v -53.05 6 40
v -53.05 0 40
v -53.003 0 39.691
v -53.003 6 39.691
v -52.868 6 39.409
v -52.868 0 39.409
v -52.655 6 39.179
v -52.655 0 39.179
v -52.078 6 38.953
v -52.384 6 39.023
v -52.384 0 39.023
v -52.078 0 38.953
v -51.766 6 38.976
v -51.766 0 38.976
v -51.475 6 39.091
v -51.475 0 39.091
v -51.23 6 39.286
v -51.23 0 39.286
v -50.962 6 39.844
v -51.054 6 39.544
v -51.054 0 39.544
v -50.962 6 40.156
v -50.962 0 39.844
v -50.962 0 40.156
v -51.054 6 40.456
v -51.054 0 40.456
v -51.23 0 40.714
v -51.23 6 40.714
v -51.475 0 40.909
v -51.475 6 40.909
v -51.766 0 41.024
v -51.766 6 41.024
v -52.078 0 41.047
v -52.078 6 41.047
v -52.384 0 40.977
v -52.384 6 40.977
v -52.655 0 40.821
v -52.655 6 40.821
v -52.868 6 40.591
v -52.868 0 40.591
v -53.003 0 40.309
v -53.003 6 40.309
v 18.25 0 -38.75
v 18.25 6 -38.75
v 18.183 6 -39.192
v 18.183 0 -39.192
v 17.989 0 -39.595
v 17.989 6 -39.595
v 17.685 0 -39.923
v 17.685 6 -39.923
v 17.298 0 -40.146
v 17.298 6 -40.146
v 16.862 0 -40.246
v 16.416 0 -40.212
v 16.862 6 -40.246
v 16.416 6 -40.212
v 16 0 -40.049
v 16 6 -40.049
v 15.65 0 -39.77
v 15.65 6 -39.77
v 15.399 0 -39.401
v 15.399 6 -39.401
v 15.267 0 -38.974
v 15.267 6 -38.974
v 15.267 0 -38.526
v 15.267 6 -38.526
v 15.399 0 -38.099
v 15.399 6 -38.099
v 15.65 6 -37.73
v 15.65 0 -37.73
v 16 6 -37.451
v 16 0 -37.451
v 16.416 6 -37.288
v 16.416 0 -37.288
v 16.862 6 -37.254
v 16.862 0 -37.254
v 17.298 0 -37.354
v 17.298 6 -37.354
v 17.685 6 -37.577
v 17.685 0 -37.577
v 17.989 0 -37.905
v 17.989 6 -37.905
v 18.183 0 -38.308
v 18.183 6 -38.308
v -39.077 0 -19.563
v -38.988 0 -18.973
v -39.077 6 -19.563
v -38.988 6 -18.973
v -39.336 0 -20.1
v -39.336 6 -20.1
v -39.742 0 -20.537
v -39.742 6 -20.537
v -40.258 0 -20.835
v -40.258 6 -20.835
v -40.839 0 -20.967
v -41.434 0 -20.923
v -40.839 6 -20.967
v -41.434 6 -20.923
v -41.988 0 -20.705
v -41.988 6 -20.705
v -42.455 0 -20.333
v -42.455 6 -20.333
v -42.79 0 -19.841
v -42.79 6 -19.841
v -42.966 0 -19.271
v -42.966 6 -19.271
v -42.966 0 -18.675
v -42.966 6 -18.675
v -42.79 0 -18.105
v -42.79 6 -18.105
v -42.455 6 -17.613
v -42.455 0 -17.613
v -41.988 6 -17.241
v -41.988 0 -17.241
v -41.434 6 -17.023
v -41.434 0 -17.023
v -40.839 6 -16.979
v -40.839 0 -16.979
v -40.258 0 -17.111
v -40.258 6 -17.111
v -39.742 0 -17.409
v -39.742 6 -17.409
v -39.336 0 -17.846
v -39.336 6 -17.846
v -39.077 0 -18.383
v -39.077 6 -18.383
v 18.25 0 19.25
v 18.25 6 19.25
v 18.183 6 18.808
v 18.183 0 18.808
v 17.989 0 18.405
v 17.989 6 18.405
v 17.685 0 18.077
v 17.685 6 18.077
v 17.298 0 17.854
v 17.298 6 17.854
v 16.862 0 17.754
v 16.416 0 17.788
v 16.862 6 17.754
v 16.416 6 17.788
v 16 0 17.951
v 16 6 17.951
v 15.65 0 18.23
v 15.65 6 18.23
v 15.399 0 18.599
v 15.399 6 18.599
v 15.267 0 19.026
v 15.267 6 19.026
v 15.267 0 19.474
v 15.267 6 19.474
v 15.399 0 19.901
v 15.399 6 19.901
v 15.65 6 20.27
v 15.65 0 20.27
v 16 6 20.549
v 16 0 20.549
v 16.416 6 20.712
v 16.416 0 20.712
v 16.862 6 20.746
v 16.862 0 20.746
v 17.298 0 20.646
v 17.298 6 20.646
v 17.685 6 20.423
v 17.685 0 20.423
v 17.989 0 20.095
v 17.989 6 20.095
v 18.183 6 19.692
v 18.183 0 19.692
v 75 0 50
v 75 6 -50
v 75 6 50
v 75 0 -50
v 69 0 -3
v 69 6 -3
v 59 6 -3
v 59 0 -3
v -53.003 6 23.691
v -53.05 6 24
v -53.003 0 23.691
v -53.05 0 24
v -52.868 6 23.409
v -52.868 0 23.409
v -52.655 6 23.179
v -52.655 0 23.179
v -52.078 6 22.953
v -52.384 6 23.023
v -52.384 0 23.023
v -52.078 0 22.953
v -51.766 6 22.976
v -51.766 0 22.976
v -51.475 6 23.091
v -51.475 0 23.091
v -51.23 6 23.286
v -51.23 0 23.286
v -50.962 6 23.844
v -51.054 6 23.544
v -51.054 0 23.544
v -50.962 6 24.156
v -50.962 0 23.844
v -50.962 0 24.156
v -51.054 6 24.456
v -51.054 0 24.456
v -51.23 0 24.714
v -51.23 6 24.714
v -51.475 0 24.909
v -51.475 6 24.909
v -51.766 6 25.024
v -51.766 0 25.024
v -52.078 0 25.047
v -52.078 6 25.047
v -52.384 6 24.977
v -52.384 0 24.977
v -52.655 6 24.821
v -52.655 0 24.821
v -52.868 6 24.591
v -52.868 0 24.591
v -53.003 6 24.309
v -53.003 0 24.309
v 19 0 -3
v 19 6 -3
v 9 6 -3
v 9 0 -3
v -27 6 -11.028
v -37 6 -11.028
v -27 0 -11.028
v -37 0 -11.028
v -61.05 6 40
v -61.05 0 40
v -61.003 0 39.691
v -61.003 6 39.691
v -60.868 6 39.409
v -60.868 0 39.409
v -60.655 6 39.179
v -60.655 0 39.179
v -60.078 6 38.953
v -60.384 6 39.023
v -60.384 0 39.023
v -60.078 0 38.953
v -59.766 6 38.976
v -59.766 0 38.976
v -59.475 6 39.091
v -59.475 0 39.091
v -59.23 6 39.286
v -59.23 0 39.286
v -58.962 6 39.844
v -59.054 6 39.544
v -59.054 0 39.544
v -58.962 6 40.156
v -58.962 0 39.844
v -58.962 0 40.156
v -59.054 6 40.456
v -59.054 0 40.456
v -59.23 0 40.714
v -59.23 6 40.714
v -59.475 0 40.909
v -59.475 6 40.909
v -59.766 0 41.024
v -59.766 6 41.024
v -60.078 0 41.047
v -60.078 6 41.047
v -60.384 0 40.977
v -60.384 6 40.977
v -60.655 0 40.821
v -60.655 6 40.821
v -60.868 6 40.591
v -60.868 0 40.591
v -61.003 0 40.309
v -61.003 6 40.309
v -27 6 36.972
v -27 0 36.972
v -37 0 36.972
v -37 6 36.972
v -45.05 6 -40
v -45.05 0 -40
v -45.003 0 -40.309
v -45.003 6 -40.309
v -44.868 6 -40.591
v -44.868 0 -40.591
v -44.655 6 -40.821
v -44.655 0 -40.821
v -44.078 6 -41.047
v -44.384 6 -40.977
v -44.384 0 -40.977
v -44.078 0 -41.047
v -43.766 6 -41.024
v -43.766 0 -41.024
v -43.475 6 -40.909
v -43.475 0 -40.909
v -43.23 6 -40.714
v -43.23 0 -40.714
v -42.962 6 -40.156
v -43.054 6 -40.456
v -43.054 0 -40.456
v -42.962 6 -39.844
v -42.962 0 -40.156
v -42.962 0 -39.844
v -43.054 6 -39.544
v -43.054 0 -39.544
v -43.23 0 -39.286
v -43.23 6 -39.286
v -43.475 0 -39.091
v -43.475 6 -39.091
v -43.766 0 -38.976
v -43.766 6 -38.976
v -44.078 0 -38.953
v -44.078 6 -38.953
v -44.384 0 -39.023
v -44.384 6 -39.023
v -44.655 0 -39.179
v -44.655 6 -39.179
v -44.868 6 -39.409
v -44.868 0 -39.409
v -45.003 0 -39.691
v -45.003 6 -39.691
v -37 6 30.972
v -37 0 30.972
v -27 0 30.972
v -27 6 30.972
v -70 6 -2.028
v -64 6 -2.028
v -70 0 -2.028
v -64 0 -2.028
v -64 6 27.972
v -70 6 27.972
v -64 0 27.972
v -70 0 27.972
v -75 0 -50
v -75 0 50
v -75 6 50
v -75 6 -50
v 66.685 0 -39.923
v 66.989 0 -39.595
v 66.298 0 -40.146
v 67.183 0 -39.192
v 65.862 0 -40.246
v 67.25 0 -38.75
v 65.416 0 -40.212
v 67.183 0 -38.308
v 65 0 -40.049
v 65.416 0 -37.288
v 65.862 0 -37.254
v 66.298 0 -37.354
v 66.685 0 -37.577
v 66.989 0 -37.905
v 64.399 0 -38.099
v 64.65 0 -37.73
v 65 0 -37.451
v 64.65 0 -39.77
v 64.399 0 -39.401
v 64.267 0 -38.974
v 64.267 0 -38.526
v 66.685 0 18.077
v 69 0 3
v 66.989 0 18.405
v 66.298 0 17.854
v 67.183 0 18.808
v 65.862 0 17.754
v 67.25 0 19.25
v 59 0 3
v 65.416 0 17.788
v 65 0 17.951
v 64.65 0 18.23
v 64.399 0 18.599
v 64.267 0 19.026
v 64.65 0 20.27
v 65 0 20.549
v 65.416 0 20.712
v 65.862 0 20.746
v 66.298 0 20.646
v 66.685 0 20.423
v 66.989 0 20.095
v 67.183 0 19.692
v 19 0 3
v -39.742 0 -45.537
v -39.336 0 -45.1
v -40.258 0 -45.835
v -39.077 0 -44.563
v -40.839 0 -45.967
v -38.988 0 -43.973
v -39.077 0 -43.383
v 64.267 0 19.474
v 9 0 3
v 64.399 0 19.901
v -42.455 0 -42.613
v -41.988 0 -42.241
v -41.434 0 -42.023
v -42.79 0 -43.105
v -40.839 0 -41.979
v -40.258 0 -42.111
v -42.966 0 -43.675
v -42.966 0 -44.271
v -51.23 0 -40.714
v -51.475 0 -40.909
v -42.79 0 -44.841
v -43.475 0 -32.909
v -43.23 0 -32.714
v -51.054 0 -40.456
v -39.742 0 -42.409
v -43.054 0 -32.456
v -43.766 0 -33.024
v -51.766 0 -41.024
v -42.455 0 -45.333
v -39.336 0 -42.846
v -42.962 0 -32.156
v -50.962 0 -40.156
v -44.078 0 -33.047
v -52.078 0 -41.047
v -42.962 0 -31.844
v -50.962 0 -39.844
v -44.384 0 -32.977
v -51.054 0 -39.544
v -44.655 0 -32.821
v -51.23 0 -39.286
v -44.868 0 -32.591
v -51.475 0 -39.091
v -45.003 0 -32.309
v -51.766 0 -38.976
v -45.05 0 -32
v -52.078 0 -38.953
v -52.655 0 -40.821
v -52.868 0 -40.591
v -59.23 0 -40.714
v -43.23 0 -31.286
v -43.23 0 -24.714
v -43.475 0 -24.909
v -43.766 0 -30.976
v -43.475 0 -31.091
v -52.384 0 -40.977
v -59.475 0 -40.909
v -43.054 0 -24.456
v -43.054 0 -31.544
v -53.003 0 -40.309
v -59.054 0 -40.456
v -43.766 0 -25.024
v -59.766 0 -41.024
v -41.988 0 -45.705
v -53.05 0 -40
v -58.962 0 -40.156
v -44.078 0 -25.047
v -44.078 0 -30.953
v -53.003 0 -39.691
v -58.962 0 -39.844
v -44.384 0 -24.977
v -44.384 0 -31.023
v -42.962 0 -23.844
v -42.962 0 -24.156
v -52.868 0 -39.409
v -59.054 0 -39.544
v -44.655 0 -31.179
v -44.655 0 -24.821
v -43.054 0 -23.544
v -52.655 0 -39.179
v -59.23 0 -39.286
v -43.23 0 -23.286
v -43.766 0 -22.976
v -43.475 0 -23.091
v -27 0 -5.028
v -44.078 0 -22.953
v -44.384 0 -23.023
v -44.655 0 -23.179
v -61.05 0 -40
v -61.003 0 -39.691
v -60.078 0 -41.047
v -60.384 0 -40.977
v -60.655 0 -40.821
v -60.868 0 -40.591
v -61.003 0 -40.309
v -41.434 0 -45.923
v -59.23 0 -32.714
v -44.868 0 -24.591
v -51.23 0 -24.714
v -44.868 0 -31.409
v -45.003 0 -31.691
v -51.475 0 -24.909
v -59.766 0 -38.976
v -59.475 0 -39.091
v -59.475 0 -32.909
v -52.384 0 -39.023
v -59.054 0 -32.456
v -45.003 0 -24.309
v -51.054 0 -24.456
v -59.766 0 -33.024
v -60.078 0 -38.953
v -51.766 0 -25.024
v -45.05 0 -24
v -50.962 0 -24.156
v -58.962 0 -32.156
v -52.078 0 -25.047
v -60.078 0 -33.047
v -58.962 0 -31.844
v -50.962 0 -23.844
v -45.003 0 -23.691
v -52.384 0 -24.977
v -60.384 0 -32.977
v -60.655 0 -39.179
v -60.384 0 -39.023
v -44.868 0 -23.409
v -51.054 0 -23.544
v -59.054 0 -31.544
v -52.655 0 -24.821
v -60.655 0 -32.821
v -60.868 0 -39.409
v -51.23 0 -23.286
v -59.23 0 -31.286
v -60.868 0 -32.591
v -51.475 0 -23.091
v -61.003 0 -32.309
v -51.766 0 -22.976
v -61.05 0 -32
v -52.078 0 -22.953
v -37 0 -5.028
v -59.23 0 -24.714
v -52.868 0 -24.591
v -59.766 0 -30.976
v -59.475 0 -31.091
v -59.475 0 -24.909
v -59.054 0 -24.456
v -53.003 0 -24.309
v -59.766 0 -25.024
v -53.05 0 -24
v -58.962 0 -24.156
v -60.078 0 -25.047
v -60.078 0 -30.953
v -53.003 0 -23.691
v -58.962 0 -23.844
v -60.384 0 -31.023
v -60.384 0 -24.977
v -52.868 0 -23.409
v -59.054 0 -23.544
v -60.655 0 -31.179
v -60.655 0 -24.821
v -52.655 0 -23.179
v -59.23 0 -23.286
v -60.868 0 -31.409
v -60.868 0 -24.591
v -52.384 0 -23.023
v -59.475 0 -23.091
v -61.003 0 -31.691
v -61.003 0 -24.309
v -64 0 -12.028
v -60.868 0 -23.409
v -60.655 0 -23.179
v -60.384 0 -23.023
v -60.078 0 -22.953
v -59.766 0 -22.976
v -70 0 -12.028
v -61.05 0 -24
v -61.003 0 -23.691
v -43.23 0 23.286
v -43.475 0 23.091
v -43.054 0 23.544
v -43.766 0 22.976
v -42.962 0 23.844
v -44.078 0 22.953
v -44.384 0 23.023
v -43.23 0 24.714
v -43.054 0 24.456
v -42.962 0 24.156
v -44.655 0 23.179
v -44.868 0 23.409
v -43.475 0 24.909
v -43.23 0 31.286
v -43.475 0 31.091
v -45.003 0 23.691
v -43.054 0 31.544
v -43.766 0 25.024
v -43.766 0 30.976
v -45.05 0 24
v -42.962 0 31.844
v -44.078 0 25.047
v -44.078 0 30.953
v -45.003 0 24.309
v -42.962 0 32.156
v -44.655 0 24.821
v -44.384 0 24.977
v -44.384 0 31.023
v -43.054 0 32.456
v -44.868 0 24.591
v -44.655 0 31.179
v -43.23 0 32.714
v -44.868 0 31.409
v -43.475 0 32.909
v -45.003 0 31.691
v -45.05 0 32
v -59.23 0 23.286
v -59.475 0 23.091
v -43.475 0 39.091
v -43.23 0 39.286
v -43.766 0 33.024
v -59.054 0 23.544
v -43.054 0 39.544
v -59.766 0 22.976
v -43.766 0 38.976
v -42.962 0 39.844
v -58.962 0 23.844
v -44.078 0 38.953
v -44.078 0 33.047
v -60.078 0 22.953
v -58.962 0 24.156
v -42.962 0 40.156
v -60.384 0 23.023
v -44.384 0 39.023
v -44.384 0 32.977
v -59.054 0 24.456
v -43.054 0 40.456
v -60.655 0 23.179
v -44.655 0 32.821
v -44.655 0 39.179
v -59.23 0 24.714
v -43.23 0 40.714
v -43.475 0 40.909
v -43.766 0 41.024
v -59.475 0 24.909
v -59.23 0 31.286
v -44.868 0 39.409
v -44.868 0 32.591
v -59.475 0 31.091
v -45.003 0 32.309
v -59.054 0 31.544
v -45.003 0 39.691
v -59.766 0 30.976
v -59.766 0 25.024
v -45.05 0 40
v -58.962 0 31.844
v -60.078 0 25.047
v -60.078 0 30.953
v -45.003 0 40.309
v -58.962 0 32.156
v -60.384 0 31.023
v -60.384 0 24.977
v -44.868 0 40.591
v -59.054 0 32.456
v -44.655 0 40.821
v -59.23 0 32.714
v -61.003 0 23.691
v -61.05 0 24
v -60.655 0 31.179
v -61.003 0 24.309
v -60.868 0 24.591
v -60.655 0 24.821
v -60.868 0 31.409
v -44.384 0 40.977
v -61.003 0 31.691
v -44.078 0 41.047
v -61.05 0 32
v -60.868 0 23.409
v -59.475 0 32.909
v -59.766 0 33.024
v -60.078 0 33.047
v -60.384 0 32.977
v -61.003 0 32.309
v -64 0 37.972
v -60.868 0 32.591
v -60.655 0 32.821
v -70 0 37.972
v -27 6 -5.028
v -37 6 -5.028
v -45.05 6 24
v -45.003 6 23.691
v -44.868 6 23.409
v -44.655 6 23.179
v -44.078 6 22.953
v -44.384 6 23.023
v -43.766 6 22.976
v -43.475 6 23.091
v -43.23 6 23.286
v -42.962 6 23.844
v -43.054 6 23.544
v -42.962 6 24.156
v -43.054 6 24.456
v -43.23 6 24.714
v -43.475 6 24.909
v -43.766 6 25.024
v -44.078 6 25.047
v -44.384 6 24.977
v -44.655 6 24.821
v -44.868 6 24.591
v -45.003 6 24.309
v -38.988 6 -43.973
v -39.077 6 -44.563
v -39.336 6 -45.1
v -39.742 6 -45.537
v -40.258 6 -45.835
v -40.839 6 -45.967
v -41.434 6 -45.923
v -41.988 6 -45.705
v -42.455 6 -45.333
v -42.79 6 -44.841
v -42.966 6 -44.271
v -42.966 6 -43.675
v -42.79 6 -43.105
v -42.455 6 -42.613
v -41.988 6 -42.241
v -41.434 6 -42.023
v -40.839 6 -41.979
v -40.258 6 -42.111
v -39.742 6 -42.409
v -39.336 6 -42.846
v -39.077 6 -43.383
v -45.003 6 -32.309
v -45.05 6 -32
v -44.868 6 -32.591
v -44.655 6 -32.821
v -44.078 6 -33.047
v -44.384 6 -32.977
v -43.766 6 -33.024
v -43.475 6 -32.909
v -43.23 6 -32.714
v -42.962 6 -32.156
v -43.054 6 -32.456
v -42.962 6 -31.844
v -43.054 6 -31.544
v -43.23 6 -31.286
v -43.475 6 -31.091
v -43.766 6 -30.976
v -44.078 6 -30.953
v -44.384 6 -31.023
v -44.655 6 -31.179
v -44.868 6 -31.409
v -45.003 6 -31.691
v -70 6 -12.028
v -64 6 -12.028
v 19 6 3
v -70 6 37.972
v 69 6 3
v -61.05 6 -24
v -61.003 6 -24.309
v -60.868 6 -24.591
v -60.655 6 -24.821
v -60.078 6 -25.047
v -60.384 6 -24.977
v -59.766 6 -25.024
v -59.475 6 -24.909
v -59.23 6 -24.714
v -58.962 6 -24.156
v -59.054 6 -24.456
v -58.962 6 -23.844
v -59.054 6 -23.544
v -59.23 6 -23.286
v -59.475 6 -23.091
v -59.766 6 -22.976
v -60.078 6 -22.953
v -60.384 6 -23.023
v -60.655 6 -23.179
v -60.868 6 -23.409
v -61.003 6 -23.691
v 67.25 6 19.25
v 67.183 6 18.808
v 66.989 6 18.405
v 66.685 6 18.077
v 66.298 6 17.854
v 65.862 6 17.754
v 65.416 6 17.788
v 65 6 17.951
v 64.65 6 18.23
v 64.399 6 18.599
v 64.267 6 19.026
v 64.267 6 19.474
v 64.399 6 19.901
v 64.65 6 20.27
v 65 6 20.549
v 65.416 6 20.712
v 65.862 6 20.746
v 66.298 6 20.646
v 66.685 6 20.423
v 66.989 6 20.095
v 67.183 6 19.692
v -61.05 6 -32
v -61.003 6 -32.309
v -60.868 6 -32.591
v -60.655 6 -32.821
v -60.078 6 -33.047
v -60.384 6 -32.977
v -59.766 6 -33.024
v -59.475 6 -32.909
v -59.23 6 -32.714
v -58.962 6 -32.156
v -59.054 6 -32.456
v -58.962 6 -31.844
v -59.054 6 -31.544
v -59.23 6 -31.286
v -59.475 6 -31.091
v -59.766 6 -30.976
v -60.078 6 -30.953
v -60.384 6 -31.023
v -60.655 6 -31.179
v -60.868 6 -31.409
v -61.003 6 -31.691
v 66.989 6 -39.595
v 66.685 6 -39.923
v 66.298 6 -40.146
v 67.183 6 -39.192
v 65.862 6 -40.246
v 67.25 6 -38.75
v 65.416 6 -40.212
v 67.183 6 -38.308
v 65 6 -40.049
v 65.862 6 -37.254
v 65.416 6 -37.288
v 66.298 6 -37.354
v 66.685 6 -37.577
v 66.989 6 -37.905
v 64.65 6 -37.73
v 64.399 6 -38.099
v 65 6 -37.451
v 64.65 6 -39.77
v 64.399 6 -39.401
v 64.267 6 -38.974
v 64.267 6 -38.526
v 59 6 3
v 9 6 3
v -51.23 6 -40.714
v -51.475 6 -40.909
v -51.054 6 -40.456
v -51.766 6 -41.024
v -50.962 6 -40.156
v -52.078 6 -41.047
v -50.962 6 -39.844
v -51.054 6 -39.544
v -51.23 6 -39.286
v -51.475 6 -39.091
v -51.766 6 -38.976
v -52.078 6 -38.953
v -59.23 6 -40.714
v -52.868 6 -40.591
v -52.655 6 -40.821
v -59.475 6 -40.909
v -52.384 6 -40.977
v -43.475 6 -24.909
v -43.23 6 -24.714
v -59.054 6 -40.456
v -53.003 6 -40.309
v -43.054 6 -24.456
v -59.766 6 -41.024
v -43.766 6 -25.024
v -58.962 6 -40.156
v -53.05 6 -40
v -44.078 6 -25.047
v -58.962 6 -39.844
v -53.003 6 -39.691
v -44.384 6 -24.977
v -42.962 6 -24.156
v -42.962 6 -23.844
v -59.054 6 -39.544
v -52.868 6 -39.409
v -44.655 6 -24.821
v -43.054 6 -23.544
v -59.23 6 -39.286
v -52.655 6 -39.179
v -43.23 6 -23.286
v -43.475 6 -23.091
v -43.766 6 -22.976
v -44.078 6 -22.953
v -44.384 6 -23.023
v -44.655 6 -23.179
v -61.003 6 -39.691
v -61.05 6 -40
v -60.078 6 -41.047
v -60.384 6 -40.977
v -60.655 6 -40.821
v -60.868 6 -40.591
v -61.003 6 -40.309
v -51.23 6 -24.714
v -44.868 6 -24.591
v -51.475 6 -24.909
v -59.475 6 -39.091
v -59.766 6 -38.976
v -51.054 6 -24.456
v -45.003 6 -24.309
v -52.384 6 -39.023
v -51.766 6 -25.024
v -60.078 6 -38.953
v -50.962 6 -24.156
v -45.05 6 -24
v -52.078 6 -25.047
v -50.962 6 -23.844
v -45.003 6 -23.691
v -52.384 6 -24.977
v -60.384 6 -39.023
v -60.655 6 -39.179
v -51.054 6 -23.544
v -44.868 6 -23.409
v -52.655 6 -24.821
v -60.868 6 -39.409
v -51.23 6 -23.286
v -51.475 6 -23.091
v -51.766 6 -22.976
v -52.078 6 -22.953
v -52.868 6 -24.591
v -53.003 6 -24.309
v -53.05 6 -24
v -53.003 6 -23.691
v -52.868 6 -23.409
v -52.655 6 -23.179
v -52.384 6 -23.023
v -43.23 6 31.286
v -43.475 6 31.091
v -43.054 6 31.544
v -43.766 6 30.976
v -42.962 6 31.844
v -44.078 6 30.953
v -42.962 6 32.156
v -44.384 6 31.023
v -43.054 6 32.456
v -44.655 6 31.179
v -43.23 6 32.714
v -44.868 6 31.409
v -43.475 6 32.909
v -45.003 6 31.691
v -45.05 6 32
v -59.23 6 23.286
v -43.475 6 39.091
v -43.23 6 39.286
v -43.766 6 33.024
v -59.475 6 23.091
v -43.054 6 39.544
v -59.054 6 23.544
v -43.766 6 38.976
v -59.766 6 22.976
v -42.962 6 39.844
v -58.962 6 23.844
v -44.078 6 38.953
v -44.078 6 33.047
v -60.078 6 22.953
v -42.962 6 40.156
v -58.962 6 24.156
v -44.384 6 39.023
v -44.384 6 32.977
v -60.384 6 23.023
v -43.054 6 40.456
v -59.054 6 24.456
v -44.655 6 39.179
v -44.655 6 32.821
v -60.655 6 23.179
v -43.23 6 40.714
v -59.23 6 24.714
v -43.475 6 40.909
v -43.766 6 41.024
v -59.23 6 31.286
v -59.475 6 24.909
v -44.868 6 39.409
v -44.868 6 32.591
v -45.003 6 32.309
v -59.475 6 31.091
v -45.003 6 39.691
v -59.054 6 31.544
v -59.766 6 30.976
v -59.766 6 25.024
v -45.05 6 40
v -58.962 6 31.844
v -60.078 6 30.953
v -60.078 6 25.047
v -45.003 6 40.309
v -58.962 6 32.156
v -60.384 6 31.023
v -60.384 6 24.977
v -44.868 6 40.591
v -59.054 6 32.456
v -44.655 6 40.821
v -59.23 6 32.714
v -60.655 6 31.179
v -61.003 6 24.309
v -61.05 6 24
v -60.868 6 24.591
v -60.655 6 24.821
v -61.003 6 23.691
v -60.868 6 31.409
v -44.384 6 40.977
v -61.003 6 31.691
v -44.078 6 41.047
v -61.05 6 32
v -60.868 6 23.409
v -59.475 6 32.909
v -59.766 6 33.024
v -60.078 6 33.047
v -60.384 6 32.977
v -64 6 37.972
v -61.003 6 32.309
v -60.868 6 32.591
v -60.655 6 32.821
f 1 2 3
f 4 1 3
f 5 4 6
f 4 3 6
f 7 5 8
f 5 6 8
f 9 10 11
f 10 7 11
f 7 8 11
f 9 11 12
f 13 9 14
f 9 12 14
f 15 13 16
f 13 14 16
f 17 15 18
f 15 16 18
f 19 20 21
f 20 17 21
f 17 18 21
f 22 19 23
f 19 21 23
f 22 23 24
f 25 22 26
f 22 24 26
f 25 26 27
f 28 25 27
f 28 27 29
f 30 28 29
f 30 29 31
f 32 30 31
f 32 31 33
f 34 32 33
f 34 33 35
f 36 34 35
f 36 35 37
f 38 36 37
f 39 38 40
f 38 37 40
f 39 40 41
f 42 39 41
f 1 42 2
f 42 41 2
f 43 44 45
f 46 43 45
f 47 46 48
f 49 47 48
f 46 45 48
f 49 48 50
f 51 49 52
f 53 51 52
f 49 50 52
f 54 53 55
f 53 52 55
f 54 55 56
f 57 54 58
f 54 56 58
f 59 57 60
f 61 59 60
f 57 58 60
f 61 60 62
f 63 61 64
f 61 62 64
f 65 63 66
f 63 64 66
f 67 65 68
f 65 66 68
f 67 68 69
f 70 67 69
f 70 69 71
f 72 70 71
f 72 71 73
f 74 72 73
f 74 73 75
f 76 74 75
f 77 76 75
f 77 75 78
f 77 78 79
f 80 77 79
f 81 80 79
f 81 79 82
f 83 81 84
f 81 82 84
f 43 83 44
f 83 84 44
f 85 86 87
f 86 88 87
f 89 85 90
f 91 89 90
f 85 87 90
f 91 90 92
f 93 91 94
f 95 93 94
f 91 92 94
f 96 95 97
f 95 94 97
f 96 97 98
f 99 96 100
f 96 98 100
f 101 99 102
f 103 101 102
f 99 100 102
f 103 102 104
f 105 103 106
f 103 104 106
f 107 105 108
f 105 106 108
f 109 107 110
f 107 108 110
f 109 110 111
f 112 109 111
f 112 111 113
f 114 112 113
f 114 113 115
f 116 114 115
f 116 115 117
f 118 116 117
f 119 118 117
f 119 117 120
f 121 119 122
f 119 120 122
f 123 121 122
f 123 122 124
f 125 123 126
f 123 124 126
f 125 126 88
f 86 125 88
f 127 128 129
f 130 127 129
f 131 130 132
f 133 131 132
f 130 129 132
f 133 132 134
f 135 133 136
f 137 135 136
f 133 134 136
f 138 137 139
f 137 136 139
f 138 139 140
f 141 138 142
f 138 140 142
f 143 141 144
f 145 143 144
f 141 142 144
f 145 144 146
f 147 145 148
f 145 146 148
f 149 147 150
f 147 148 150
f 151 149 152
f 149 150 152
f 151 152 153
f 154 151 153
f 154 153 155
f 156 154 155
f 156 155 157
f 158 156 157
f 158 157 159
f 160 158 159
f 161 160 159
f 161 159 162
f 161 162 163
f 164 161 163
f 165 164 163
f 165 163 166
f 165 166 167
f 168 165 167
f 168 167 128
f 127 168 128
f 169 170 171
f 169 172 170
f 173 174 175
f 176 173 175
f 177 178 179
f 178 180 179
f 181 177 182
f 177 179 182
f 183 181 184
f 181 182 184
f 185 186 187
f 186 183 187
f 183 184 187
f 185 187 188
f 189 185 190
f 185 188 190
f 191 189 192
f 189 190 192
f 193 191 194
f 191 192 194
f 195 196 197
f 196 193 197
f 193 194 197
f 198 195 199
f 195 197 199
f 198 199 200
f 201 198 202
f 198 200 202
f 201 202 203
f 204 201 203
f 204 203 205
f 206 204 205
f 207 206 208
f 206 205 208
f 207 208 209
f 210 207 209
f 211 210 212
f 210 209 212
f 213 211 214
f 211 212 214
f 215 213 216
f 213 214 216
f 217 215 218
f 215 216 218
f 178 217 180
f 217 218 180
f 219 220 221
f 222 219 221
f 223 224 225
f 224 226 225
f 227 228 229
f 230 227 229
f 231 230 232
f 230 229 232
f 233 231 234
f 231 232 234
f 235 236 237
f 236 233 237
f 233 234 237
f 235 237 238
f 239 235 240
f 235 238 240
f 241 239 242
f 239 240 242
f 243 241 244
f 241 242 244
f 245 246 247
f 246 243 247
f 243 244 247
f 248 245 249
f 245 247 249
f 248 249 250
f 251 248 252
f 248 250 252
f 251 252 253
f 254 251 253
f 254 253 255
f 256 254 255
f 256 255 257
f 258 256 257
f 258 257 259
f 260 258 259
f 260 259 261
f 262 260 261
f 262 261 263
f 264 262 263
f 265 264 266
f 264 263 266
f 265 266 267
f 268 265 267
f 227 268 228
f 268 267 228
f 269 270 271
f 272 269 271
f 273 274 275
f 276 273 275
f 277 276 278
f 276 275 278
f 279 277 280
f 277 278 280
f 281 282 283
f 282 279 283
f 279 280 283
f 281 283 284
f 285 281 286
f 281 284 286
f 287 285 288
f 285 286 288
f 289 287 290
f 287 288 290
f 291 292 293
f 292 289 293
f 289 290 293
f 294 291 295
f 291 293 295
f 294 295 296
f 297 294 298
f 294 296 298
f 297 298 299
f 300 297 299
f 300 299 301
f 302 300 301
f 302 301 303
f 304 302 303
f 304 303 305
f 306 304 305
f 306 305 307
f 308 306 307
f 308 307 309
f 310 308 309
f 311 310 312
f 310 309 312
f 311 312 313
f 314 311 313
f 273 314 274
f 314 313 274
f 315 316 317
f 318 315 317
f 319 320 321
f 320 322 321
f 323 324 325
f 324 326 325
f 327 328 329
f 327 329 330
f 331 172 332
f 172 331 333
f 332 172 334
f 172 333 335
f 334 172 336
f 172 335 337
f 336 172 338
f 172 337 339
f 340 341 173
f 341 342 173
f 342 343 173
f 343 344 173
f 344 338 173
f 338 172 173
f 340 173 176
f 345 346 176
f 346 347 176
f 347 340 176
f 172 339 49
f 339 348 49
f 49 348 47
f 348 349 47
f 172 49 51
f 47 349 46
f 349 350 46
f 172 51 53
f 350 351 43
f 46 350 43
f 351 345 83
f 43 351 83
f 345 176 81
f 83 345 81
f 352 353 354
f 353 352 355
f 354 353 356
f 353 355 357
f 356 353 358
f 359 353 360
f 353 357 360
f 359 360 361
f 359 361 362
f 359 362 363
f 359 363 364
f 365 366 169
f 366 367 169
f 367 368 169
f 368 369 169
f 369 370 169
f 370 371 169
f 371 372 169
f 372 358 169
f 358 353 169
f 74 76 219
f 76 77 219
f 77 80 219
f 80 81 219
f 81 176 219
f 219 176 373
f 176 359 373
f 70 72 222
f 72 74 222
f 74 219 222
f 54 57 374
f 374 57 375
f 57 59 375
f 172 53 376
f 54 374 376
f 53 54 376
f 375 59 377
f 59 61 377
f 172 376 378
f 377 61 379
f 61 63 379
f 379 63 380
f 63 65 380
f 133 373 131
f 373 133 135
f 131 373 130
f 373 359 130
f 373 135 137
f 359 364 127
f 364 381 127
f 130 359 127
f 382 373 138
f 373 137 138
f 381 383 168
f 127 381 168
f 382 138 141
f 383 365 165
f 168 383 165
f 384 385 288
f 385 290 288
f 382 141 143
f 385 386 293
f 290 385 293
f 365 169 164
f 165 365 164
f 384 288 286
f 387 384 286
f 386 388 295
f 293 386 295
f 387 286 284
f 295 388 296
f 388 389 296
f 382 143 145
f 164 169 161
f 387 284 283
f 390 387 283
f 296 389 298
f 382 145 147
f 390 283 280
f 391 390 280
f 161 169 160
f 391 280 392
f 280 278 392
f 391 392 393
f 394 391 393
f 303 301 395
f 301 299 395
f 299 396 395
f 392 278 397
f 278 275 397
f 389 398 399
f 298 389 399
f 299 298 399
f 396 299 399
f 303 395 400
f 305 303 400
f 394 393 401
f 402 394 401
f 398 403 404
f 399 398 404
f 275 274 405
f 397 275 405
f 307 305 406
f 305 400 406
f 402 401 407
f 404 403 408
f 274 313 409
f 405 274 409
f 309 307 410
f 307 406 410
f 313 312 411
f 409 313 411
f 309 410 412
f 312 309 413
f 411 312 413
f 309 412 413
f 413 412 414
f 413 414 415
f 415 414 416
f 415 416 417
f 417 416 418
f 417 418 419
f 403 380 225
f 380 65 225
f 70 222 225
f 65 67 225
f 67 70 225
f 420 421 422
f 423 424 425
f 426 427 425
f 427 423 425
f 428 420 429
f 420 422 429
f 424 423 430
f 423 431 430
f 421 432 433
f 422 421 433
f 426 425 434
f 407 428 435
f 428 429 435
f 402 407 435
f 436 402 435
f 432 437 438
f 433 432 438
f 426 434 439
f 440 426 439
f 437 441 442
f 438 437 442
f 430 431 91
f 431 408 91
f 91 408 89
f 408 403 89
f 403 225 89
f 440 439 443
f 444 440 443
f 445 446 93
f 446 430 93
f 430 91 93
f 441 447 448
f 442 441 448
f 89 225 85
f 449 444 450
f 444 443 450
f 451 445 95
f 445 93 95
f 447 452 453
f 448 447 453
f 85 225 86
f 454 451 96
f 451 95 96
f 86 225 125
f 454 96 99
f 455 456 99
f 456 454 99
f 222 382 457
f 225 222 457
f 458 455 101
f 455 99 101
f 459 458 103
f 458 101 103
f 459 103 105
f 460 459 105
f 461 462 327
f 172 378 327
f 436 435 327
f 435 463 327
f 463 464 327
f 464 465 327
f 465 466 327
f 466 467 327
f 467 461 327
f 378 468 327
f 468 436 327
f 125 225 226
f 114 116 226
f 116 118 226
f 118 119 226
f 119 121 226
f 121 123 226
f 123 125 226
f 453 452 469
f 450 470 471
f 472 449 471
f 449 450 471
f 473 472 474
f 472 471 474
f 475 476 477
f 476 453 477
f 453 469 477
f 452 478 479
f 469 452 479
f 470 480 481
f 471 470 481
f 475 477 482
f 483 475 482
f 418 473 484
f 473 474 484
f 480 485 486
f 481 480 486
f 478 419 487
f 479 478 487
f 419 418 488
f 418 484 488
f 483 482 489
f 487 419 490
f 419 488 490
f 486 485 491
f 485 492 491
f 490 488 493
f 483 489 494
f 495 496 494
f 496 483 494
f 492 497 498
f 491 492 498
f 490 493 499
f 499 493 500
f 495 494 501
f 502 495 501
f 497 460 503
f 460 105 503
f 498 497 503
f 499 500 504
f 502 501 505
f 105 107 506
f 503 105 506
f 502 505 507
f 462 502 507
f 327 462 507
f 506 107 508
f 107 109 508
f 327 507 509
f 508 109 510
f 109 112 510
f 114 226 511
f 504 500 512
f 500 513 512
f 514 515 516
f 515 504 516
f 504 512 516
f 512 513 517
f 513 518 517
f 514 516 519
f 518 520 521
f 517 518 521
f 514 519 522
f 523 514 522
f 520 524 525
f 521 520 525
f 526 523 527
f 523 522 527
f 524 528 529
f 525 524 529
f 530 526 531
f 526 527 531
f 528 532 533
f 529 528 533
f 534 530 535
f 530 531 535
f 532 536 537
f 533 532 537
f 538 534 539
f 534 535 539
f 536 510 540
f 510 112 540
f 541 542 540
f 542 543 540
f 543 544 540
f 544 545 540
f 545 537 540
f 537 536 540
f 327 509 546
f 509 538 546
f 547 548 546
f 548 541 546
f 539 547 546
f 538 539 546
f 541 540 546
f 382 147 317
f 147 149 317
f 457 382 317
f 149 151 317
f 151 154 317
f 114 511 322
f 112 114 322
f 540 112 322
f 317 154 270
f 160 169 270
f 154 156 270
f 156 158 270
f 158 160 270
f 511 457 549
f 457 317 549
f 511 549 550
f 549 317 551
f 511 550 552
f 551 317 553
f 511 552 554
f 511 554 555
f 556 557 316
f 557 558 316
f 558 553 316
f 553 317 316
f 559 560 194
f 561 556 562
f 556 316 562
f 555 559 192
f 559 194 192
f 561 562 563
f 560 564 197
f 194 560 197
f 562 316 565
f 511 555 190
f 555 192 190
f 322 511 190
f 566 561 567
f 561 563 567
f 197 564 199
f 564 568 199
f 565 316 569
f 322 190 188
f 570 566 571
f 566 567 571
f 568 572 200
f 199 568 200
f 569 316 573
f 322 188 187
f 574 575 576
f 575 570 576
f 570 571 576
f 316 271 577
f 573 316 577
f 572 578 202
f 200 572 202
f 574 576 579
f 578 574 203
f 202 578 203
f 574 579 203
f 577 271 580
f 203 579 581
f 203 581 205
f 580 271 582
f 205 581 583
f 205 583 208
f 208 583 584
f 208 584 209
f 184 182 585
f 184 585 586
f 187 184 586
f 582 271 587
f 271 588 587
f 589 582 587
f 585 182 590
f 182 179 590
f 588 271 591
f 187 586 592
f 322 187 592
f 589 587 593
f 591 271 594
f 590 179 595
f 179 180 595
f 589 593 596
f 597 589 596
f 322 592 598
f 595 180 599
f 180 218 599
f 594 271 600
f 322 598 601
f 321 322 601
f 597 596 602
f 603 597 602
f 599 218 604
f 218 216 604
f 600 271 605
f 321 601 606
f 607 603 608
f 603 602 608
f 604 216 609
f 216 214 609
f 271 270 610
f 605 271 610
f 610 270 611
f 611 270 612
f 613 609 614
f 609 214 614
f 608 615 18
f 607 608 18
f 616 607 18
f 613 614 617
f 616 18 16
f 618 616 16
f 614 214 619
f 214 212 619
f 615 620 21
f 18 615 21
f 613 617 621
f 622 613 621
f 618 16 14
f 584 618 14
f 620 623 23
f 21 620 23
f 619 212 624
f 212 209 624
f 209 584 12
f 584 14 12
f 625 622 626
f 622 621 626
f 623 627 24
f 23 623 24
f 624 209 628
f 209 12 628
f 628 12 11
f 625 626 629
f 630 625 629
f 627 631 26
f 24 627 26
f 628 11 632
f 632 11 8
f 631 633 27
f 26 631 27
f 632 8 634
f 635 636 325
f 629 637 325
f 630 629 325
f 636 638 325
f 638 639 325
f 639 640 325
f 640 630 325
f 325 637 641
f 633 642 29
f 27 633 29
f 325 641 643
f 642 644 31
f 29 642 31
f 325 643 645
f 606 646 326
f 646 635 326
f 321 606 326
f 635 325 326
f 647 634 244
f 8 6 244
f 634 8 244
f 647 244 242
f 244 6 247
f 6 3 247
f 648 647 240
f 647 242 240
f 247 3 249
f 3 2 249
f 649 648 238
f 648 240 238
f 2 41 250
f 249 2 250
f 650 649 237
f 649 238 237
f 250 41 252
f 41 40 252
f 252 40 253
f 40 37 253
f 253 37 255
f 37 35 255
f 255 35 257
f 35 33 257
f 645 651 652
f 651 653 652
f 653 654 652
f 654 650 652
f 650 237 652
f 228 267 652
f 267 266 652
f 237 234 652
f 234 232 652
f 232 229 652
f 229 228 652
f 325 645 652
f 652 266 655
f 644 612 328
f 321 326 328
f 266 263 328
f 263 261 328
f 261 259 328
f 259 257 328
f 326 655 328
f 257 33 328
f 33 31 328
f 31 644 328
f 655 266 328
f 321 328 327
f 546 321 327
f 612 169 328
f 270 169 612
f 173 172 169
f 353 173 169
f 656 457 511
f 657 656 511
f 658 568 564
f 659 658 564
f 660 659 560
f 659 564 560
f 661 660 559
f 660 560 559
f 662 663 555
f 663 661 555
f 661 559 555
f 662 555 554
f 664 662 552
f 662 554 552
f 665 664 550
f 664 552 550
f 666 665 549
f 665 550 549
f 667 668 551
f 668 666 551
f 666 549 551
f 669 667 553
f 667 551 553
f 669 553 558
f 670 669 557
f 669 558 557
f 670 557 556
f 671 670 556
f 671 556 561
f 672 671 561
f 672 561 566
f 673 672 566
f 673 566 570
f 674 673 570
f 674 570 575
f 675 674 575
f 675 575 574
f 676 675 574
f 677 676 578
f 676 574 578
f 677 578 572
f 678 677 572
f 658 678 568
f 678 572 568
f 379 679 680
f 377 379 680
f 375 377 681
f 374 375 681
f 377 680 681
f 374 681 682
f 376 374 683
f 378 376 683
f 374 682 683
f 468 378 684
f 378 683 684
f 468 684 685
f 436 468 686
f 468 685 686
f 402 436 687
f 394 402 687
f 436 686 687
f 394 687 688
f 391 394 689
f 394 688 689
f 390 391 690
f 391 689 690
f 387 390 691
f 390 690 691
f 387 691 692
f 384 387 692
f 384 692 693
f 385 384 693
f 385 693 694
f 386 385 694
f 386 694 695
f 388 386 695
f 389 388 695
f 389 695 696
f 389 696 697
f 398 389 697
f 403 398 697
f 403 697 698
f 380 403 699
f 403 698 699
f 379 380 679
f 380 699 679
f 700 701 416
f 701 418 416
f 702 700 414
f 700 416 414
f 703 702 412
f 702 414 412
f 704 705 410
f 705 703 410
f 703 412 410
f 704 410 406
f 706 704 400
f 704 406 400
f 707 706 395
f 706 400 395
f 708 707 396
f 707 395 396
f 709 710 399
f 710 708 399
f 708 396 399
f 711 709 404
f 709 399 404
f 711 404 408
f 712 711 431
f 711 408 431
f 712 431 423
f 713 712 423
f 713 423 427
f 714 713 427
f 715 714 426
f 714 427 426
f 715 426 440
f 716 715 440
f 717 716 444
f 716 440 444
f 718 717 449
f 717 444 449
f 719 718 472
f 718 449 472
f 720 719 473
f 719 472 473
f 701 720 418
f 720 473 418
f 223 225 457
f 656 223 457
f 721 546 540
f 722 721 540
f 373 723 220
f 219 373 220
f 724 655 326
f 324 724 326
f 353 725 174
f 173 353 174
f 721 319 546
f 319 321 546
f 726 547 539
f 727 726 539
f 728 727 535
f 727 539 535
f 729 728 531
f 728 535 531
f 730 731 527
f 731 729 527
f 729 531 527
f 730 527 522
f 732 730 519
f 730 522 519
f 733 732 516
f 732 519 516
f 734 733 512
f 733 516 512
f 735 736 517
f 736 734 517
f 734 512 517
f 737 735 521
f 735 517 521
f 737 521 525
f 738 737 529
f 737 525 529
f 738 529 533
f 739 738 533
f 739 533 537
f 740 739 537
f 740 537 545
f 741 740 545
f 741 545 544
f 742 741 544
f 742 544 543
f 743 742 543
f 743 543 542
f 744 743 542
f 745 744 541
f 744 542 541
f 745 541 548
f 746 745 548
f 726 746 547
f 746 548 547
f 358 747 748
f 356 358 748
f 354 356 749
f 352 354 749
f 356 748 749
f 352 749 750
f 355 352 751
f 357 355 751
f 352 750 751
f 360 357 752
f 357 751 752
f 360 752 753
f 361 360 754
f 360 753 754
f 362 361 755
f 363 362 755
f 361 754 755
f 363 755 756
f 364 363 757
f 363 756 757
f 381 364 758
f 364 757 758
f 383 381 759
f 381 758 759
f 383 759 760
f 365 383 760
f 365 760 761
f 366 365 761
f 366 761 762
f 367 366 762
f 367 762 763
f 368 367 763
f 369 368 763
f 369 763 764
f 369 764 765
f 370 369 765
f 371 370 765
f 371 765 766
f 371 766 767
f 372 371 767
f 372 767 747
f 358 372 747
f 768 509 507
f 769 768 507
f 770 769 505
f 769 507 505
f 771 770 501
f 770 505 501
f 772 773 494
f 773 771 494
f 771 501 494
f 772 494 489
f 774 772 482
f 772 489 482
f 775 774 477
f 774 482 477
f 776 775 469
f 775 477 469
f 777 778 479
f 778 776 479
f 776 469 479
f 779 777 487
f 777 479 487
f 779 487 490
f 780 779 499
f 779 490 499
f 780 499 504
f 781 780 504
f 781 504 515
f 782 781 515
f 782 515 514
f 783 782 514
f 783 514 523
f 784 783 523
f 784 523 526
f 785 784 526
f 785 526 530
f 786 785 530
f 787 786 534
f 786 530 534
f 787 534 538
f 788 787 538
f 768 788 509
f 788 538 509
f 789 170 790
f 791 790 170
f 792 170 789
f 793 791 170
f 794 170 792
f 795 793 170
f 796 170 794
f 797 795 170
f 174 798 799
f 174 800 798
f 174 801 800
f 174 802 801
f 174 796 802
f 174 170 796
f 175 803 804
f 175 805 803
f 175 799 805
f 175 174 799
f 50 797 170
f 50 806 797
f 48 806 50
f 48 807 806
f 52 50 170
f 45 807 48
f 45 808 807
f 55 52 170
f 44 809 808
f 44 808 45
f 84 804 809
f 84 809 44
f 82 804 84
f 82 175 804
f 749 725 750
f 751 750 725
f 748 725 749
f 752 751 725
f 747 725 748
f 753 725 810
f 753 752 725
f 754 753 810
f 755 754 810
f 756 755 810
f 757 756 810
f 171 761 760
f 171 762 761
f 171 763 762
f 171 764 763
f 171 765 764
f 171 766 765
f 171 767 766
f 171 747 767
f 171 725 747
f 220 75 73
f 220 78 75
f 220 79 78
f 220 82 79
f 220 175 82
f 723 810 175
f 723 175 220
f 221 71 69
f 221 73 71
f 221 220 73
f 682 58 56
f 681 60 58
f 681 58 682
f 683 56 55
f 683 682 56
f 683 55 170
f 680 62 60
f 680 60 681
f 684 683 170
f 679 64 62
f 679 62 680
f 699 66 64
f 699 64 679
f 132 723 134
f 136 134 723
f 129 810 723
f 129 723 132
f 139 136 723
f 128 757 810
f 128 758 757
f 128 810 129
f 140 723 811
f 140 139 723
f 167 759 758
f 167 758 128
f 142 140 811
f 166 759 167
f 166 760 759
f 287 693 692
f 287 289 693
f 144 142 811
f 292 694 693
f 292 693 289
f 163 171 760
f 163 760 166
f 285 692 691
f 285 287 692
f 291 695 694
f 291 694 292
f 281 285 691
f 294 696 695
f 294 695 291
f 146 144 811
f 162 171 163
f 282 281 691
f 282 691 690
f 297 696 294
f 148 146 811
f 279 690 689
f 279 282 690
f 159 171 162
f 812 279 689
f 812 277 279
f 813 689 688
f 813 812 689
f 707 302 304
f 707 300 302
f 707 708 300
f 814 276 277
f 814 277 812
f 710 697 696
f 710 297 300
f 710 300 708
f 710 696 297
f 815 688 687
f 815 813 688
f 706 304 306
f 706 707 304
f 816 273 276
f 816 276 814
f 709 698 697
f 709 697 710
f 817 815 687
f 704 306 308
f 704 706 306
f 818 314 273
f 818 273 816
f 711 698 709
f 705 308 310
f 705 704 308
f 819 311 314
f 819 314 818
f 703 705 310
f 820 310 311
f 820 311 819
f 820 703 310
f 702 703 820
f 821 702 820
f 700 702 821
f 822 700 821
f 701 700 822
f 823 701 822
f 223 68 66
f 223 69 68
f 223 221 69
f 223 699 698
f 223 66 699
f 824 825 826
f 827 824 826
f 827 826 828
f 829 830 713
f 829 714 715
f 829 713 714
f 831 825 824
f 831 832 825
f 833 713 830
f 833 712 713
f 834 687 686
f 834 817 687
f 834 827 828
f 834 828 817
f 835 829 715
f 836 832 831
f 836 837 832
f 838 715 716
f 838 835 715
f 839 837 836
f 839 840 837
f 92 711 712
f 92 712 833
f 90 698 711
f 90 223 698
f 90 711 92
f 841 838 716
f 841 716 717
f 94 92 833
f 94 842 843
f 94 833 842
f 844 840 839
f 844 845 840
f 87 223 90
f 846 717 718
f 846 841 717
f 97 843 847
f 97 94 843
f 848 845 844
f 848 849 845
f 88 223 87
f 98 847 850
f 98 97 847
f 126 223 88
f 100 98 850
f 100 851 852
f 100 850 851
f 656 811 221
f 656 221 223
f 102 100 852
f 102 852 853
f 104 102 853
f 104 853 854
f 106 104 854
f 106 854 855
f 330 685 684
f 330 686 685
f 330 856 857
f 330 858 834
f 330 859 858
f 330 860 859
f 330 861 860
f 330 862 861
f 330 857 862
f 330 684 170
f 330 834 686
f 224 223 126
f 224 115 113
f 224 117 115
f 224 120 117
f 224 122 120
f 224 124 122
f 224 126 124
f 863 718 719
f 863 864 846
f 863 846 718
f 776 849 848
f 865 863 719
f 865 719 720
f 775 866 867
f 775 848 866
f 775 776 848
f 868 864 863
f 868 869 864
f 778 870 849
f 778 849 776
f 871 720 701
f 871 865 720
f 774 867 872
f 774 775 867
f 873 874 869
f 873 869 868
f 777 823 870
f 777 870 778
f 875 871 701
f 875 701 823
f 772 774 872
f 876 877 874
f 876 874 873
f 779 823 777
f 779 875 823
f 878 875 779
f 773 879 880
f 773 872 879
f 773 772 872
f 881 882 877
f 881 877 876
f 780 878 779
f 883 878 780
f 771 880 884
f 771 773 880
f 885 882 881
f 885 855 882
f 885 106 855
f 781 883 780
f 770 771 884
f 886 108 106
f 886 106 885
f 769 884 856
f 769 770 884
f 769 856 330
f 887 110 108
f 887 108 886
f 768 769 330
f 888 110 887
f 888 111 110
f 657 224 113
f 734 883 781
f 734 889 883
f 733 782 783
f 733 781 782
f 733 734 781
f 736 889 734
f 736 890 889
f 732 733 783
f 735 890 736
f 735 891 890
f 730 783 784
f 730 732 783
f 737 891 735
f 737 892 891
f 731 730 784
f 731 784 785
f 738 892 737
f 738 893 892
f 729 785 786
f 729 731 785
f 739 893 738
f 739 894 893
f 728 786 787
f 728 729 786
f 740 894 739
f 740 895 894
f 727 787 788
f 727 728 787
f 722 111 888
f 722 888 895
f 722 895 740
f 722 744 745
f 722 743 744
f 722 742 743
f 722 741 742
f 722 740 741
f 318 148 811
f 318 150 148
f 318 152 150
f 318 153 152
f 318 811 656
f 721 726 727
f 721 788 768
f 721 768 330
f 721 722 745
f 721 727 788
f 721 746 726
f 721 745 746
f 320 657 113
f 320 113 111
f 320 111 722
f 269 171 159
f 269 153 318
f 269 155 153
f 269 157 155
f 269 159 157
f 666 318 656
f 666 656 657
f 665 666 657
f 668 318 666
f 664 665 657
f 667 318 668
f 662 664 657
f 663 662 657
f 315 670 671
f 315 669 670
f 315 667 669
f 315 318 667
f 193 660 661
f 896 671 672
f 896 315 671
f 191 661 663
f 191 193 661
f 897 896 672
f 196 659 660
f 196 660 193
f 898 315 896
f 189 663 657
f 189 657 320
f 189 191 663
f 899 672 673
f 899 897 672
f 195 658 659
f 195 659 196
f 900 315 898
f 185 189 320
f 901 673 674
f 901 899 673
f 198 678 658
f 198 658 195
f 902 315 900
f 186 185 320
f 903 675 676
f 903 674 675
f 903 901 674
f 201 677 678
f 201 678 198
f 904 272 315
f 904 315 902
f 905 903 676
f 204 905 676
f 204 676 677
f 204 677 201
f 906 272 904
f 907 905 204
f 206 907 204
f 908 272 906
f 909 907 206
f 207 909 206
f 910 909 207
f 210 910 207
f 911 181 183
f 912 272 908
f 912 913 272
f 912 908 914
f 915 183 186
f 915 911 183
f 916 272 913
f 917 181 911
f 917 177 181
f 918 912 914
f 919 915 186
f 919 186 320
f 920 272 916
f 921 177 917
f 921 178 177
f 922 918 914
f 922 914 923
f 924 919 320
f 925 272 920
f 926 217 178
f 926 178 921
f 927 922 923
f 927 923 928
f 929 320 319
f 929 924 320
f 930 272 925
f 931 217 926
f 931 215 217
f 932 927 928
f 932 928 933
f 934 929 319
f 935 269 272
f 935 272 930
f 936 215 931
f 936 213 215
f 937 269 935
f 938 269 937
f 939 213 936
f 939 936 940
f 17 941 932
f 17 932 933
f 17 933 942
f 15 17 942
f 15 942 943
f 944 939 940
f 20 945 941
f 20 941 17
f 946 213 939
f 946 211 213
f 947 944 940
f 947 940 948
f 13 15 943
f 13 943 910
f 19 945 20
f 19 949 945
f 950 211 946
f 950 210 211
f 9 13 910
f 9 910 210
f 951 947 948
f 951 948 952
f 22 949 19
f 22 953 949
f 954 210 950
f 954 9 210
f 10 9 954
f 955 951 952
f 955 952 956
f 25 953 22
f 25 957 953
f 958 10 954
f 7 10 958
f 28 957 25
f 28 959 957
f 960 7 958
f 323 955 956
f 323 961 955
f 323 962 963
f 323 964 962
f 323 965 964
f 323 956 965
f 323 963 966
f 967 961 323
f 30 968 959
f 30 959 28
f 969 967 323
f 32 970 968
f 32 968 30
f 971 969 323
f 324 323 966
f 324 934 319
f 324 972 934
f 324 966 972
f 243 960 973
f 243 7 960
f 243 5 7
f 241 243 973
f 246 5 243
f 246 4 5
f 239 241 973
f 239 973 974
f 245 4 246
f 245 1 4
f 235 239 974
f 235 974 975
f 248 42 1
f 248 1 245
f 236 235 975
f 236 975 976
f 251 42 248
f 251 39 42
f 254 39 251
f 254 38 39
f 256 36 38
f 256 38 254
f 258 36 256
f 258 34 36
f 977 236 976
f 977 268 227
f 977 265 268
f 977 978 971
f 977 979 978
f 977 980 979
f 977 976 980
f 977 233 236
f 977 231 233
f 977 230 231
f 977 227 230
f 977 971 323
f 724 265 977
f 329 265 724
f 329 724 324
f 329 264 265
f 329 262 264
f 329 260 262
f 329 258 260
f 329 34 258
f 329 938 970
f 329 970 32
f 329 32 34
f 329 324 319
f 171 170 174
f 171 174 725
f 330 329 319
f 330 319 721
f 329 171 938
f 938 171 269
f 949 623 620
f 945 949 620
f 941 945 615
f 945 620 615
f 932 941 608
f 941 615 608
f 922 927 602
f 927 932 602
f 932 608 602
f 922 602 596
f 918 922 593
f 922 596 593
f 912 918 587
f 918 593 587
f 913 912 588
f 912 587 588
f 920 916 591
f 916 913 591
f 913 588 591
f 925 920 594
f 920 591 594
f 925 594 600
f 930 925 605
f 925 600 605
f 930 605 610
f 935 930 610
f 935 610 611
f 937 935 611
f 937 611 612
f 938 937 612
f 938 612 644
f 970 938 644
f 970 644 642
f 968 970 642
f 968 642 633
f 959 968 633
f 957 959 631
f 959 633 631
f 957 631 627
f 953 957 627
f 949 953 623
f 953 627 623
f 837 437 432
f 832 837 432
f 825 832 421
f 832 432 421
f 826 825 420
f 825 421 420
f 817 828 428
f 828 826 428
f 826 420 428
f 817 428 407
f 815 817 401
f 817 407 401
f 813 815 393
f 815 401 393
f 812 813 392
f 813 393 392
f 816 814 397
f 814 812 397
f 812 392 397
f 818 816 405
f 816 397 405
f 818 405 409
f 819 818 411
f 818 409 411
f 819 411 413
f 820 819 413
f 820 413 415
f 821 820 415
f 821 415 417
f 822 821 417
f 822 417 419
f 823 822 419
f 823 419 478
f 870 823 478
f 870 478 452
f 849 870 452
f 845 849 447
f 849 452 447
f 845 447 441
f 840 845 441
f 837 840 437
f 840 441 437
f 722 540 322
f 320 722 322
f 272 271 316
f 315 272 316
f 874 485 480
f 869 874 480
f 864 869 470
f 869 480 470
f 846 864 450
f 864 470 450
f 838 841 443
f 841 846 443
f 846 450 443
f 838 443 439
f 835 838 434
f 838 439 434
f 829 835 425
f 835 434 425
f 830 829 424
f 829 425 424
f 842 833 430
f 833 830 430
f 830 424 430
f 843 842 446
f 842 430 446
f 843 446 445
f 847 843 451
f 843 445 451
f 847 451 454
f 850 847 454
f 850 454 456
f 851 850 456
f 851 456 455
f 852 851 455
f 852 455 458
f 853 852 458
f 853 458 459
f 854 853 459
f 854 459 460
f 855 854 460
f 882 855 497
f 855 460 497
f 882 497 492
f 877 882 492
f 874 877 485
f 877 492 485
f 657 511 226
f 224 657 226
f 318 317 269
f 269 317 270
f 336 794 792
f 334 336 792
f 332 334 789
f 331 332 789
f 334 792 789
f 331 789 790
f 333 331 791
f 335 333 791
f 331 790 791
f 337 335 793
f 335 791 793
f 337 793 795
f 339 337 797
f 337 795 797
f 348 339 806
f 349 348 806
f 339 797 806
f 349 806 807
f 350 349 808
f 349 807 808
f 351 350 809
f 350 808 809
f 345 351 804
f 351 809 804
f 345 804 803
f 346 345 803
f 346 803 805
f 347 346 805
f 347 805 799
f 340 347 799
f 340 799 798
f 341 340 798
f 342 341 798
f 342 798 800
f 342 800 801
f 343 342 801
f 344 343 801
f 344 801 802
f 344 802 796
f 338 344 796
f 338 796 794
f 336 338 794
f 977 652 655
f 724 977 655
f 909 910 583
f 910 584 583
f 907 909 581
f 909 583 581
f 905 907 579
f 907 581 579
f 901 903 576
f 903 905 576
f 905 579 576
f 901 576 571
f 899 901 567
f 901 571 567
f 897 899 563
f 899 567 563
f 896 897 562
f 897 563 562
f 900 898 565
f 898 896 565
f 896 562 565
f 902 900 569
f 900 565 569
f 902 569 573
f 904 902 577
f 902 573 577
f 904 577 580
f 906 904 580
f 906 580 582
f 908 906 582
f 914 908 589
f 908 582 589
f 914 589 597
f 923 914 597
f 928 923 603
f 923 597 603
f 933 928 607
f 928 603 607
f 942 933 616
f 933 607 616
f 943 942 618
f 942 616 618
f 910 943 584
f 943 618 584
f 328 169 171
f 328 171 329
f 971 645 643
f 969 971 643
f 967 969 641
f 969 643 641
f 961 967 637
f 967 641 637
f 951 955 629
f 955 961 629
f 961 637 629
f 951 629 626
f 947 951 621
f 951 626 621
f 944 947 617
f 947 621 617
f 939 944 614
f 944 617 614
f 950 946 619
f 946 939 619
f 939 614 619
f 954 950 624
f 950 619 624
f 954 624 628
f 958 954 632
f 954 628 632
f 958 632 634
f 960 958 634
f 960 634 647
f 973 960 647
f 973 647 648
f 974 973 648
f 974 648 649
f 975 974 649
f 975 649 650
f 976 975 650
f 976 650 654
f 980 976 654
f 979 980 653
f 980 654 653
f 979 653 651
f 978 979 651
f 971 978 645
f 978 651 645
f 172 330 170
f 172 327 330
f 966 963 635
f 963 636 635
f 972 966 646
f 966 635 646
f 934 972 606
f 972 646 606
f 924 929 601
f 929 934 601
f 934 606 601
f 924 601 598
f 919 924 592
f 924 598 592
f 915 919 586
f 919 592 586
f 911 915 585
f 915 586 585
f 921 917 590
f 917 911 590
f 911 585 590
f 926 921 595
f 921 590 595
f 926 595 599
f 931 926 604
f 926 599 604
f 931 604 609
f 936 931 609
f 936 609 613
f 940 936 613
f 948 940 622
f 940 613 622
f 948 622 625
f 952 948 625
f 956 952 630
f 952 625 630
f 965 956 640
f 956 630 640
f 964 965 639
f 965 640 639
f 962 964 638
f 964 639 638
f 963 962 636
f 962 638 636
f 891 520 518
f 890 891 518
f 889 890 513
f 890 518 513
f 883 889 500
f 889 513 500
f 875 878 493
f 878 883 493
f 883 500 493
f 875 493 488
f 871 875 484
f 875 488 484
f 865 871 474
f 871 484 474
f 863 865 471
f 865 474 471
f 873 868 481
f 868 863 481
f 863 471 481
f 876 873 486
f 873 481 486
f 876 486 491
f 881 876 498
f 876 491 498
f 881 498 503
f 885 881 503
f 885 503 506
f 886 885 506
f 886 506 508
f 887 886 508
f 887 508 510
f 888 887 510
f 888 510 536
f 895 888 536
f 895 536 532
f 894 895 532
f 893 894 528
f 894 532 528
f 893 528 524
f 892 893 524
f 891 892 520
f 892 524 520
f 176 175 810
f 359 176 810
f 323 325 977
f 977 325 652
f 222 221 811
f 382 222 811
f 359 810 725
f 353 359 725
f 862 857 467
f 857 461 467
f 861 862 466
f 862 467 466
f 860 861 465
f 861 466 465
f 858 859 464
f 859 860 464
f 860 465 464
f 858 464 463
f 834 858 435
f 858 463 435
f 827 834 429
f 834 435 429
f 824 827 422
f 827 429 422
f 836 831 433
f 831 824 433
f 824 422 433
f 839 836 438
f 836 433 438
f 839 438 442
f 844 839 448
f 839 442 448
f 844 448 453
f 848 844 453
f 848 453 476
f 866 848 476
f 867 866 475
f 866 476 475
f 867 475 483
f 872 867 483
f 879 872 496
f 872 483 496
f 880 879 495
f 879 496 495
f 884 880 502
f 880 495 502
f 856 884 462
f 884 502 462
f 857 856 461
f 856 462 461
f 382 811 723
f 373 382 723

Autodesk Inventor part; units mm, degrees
ref_plane "YZ Plane" through (0, 0, 0) normal (1, 0, 0) x (0, 1, 0)
ref_plane "XZ Plane" through (0, 0, 0) normal (0, 1, 0) x (-1, 0, 0)
ref_plane "XY Plane" through (0, 0, 0) normal (0, 0, 1) x (1, 0, 0)
sketch "Esquisse1" plane through (0, 0, 0) normal (0, 1, 0) x (-1, 0, 0)
  line L0 (-75, 50) -> (75, 50)
  line L1 (75, 50) -> (75, -50)
  line L2 (75, -50) -> (-75, -50)
  line L3 (-75, -50) -> (-75, 50)
  line L4 (75, 50) -> (-75, -50) construction
  circle A0 centre (60, -40) radius 1.05
  circle A1 centre (52, -40) radius 1.05
  circle A2 centre (44, -40) radius 1.05
  circle A3 centre (60, -32) radius 1.05
  circle A4 centre (52, -32) radius 1.05 construction
  circle A5 centre (44, -32) radius 1.05
  circle A6 centre (60, -24) radius 1.05
  circle A7 centre (52, -24) radius 1.05
  circle A8 centre (44, -24) radius 1.05
  line L5 (75, 0) -> (-75, 0) construction
  circle A9 centre (60, 40) radius 1.05
  circle A10 centre (52, 40) radius 1.05
  circle A11 centre (44, 40) radius 1.05
  circle A12 centre (60, 32) radius 1.05
  circle A13 centre (52, 32) radius 1.05 construction
  circle A14 centre (44, 32) radius 1.05
  circle A15 centre (60, 24) radius 1.05
  circle A16 centre (52, 24) radius 1.05
  circle A17 centre (44, 24) radius 1.05
  line L6 (64, -2.0284) -> (70, -2.0284)
  line L7 (70, -2.0284) -> (70, -12.0284)
  line L8 (70, -12.0284) -> (64, -12.0284)
  line L9 (64, -12.0284) -> (64, -2.0284)
  line L10 (64, -2.0284) -> (70, -12.0284) construction
  line L11 (70, -2.0284) -> (64, -12.0284) construction
  line L12 (64, 37.9716) -> (70, 37.9716)
  line L13 (70, 37.9716) -> (70, 27.9716)
  line L14 (70, 27.9716) -> (64, 27.9716)
  line L15 (64, 27.9716) -> (64, 37.9716)
  line L16 (64, 37.9716) -> (70, 27.9716) construction
  line L17 (70, 37.9716) -> (64, 27.9716) construction
  line L18 (27, -5.0284) -> (37, -5.0284)
  line L19 (37, -5.0284) -> (37, -11.0284)
  line L20 (37, -11.0284) -> (27, -11.0284)
  line L21 (27, -11.0284) -> (27, -5.0284)
  line L22 (27, -5.0284) -> (37, -11.0284) construction
  line L23 (37, -5.0284) -> (27, -11.0284) construction
  line L24 (27, 36.9716) -> (37, 36.9716)
  line L25 (37, 36.9716) -> (37, 30.9716)
  line L26 (37, 30.9716) -> (27, 30.9716)
  line L27 (27, 30.9716) -> (27, 36.9716)
  line L28 (27, 36.9716) -> (37, 30.9716) construction
  line L29 (37, 36.9716) -> (27, 30.9716) construction
  point P0 (0, 0)
  point P1 (67, -7.0284)
  point P2 (67, 32.9716)
  point P3 (32, -8.0284)
  point P4 (32, 33.9716)
  dimension "d0" = 150
  dimension "d1" = 100
  dimension "d2" = 2.1
  dimension "d3" = 10
  dimension "d4" = 15
  dimension "d7" = 8
  dimension "d10" = 8
  dimension "d25" = 50
  dimension "d26" = 0
  dimension "d27" = 6
  dimension "d28" = 10
  dimension "d29" = 6
  dimension "d30" = 10
  dimension "d31" = 50
  dimension "d32" = 5
  dimension "d33" = 5
  dimension "d34" = 10
  dimension "d35" = 6
  dimension "d36" = 6
  dimension "d37" = 36
  dimension "d38" = 35
  dimension "d39" = 1
ref_plane "Plan de construction1" through (0, 6, 0) normal (0, 1, 0) x (1, 0, 0)
extrude "Extrusion2" add sketch "Esquisse1" along normal blind 6
sketch "Esquisse3" plane through (0, 6, 0) normal (0, 1, 0) x (1, 0, 0)
  line L0 (-37, -36.9716) -> (-37, -30.9716) construction
  line L1 (-37, -30.9716) -> (-27, -30.9716) construction
  line L2 (-27, -30.9716) -> (-27, -36.9716) construction
  line L3 (-27, -36.9716) -> (-37, -36.9716) construction
  line L4 (-37, 5.0284) -> (-37, 11.0284) construction
  line L5 (-37, 11.0284) -> (-27, 11.0284) construction
  line L6 (-27, 11.0284) -> (-27, 5.0284) construction
  line L7 (-27, 5.0284) -> (-37, 5.0284) construction
  line L8 (-70, -37.9716) -> (-70, -27.9716) construction
  line L9 (-70, -27.9716) -> (-64, -27.9716) construction
  line L10 (-64, -27.9716) -> (-64, -37.9716) construction
  line L11 (-64, -37.9716) -> (-70, -37.9716) construction
  line L12 (-70, 2.0284) -> (-70, 12.0284) construction
  line L13 (-70, 12.0284) -> (-64, 12.0284) construction
  line L14 (-64, 12.0284) -> (-64, 2.0284) construction
  line L15 (-64, 2.0284) -> (-70, 2.0284) construction
  circle A0 centre (-60, -40) radius 1.05 construction
  circle A1 centre (-44, -24) radius 1.05 construction
  circle A2 centre (-44, -32) radius 1.05 construction
  circle A3 centre (-44, -40) radius 1.05 construction
  circle A4 centre (-52, -24) radius 1.05 construction
  circle A5 centre (-52, -40) radius 1.05 construction
  circle A6 centre (-60, -24) radius 1.05 construction
  circle A7 centre (-60, -32) radius 1.05 construction
  circle A8 centre (-44, 24) radius 1.05 construction
  circle A9 centre (-52, 24) radius 1.05 construction
  circle A10 centre (-60, 24) radius 1.05 construction
  circle A11 centre (-44, 32) radius 1.05 construction
  circle A12 centre (-60, 32) radius 1.05 construction
  circle A13 centre (-44, 40) radius 1.05 construction
  circle A14 centre (-52, 40) radius 1.05 construction
  circle A15 centre (-60, 40) radius 1.05 construction
  line L16 (-75, -50) -> (75, -50) construction
  line L17 (75, -50) -> (75, 50) construction
  line L18 (75, 50) -> (-75, 50) construction
  line L19 (-75, 50) -> (-75, -50) construction
  line L20 (-27, 8.0284) -> (13, 8.0284) construction
  line L21 (69, -42.5) -> (13, -42.5) construction
  line L22 (13, -42.5) -> (13, 42.5) construction
  line L23 (13, 42.5) -> (69, 42.5) construction
  line L24 (69, 42.5) -> (69, -42.5) construction
  line L25 (69, -42.5) -> (13, 42.5) construction
  line L26 (13, -42.5) -> (69, 42.5) construction
  circle A16 centre (16.75, 38.75) radius 1.5
  circle A17 centre (65.75, 38.75) radius 1.5
  circle A18 centre (16.75, -19.25) radius 1.5
  circle A19 centre (65.75, -19.25) radius 1.5
  point P0 (0, 0)
  point P1 (41, 0)
  dimension "d42" = 40
  dimension "d43" = 56
  dimension "d44" = 85
  dimension "d45" = 0
  dimension "d46" = 3
  dimension "d47" = 3.75
  dimension "d48" = 3.75
  dimension "d51" = 49
  dimension "d54" = 58
extrude "Extrusion3" cut sketch "Esquisse3" against normal blind 6
sketch "Esquisse4" plane through (0, 6, 0) normal (0, 1, 0) x (1, 0, 0)
  line L0 (-40.9885, 18.973) -> (-1.9885, 18.973) construction
  line L1 (-1.9885, 18.973) -> (-1.9885, 43.973) construction
  line L2 (-1.9885, 43.973) -> (-40.9885, 43.973) construction
  line L3 (-40.9885, 43.973) -> (-40.9885, 18.973) construction
  line L4 (-40.9885, 18.973) -> (-1.9885, 43.973) construction
  line L5 (-1.9885, 18.973) -> (-40.9885, 43.973) construction
  circle A0 centre (-40.9885, 43.973) radius 2
  circle A1 centre (-40.9885, 18.973) radius 2
  point P0 (0, 0)
  point P1 (-21.4885, 31.473)
  dimension "d59" = 39
  dimension "d60" = 25
  dimension "d61" = 4
  dimension "d62" = 4
extrude "Extrusion4" cut sketch "Esquisse4" against normal blind 10
sketch "Esquisse5" plane through (0, 6, 0) normal (0, 1, 0) x (1, 0, 0)
  line L0 (9, -3) -> (19, -3)
  line L1 (19, -3) -> (19, 3)
  line L2 (19, 3) -> (9, 3)
  line L3 (9, 3) -> (9, -3)
  line L4 (9, -3) -> (19, 3) construction
  line L5 (19, -3) -> (9, 3) construction
  line L6 (59, -3) -> (69, -3)
  line L7 (69, -3) -> (69, 3)
  line L8 (69, 3) -> (59, 3)
  line L9 (59, 3) -> (59, -3)
  line L10 (59, -3) -> (69, 3) construction
  line L11 (69, -3) -> (59, 3) construction
  line L12 (75, 50) -> (75, -50) projected
  point P0 (0, 0)
  point P1 (14, 0)
  point P2 (64, 0)
  dimension "d65" = 10
  dimension "d66" = 6
  dimension "d67" = 10
  dimension "d68" = 6
  dimension "d71" = 60
  dimension "d72" = 6
extrude "Extrusion5" cut sketch "Esquisse5" against normal blind 10
properties part number "base"
